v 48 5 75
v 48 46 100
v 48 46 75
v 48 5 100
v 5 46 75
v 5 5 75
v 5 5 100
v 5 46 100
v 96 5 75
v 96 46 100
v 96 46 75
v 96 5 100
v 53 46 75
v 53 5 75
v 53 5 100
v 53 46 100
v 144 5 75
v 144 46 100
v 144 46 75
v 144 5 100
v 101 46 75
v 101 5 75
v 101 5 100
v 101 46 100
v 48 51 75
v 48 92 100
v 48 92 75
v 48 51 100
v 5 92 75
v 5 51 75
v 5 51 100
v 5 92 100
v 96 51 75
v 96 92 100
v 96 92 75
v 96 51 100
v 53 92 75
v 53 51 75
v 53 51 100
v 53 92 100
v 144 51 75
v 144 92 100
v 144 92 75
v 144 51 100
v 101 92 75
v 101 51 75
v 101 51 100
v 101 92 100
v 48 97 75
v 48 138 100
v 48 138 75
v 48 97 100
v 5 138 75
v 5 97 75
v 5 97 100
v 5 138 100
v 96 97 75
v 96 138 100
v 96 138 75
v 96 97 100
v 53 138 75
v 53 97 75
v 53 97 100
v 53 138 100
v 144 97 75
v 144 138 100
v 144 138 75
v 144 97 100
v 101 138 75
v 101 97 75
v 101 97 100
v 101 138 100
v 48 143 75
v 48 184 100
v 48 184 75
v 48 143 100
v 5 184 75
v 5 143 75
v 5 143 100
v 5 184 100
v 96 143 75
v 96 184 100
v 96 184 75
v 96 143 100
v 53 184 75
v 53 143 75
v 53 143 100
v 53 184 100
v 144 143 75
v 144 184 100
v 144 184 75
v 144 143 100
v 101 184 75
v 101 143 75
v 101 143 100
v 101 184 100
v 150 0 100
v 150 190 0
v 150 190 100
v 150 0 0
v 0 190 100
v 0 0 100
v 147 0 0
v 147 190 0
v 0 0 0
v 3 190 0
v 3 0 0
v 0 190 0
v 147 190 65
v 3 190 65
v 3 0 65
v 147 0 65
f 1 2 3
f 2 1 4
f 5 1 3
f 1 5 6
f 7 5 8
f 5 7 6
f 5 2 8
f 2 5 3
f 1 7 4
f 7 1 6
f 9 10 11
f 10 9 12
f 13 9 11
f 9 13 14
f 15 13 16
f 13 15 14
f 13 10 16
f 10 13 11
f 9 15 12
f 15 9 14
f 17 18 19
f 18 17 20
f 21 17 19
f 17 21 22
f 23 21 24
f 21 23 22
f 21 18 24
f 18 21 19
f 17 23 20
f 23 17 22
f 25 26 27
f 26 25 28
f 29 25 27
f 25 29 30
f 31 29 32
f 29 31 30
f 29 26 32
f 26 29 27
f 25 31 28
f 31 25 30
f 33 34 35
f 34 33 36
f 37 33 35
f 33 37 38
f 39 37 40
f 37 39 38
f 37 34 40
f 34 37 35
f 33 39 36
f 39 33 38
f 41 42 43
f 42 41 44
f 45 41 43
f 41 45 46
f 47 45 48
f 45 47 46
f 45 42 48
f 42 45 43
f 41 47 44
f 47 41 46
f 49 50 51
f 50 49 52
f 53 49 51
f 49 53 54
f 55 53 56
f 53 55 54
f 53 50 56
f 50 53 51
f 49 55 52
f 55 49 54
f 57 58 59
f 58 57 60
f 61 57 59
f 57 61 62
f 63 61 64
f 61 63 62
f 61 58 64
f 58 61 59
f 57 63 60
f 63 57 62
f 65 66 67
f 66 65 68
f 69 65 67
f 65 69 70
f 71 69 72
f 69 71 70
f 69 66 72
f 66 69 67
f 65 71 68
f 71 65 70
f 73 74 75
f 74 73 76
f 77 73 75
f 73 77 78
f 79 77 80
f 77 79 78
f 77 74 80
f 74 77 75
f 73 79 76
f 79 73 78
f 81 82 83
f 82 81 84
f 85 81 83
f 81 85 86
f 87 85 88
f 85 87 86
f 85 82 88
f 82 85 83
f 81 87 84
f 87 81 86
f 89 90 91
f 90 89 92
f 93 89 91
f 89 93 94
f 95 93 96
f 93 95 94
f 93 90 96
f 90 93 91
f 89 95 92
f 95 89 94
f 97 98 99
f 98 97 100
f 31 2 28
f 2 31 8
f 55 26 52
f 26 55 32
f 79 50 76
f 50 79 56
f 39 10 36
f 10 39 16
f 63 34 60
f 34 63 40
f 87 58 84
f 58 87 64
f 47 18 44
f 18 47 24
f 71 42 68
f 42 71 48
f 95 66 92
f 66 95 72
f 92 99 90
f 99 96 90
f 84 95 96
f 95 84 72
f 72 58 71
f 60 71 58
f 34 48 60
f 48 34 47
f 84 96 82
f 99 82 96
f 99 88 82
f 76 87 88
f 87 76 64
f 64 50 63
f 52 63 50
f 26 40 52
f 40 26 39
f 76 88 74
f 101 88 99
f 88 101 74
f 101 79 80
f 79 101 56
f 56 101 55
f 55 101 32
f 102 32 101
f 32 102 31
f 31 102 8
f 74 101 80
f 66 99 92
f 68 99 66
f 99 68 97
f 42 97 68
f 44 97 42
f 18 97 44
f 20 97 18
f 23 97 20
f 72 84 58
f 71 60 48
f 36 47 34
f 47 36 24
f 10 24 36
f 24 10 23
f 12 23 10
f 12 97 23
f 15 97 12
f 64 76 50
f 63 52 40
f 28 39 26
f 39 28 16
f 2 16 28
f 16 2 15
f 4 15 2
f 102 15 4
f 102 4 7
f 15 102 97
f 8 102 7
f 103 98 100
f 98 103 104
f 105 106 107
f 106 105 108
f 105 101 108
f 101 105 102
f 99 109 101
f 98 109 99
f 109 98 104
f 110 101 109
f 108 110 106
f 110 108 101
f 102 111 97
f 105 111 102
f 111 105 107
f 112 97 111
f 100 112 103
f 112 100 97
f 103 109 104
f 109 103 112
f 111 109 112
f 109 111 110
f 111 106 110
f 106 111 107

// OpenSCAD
BoxX=150;
BoxY=190;
BoxZ=100;
Space=5;
Start=10;
Wall=3;
Floor=5;
Raise=30;
Buffer=5;
CubbyX=43;
CubbyY=41;
CXSpace=CubbyX+Space;
CYSpace=CubbyY+Space;
DW=Wall*2;
Legs=BoxZ-Raise;
DB=Buffer*2;

difference()
{
  cube([BoxX,BoxY,BoxZ]);
  translate([Wall,-Buffer,-Buffer]) cube([BoxX-DW,BoxY+DB,Legs]);
  for (y=[Space:CYSpace:BoxY-CubbyY])
  {
    for (x=[Space:CXSpace:BoxX-CubbyX])
    {
      translate([x,y,Legs+Floor]) cube([CubbyX,CubbyY,Legs+Floor]);
      
    }
  }
  
}
